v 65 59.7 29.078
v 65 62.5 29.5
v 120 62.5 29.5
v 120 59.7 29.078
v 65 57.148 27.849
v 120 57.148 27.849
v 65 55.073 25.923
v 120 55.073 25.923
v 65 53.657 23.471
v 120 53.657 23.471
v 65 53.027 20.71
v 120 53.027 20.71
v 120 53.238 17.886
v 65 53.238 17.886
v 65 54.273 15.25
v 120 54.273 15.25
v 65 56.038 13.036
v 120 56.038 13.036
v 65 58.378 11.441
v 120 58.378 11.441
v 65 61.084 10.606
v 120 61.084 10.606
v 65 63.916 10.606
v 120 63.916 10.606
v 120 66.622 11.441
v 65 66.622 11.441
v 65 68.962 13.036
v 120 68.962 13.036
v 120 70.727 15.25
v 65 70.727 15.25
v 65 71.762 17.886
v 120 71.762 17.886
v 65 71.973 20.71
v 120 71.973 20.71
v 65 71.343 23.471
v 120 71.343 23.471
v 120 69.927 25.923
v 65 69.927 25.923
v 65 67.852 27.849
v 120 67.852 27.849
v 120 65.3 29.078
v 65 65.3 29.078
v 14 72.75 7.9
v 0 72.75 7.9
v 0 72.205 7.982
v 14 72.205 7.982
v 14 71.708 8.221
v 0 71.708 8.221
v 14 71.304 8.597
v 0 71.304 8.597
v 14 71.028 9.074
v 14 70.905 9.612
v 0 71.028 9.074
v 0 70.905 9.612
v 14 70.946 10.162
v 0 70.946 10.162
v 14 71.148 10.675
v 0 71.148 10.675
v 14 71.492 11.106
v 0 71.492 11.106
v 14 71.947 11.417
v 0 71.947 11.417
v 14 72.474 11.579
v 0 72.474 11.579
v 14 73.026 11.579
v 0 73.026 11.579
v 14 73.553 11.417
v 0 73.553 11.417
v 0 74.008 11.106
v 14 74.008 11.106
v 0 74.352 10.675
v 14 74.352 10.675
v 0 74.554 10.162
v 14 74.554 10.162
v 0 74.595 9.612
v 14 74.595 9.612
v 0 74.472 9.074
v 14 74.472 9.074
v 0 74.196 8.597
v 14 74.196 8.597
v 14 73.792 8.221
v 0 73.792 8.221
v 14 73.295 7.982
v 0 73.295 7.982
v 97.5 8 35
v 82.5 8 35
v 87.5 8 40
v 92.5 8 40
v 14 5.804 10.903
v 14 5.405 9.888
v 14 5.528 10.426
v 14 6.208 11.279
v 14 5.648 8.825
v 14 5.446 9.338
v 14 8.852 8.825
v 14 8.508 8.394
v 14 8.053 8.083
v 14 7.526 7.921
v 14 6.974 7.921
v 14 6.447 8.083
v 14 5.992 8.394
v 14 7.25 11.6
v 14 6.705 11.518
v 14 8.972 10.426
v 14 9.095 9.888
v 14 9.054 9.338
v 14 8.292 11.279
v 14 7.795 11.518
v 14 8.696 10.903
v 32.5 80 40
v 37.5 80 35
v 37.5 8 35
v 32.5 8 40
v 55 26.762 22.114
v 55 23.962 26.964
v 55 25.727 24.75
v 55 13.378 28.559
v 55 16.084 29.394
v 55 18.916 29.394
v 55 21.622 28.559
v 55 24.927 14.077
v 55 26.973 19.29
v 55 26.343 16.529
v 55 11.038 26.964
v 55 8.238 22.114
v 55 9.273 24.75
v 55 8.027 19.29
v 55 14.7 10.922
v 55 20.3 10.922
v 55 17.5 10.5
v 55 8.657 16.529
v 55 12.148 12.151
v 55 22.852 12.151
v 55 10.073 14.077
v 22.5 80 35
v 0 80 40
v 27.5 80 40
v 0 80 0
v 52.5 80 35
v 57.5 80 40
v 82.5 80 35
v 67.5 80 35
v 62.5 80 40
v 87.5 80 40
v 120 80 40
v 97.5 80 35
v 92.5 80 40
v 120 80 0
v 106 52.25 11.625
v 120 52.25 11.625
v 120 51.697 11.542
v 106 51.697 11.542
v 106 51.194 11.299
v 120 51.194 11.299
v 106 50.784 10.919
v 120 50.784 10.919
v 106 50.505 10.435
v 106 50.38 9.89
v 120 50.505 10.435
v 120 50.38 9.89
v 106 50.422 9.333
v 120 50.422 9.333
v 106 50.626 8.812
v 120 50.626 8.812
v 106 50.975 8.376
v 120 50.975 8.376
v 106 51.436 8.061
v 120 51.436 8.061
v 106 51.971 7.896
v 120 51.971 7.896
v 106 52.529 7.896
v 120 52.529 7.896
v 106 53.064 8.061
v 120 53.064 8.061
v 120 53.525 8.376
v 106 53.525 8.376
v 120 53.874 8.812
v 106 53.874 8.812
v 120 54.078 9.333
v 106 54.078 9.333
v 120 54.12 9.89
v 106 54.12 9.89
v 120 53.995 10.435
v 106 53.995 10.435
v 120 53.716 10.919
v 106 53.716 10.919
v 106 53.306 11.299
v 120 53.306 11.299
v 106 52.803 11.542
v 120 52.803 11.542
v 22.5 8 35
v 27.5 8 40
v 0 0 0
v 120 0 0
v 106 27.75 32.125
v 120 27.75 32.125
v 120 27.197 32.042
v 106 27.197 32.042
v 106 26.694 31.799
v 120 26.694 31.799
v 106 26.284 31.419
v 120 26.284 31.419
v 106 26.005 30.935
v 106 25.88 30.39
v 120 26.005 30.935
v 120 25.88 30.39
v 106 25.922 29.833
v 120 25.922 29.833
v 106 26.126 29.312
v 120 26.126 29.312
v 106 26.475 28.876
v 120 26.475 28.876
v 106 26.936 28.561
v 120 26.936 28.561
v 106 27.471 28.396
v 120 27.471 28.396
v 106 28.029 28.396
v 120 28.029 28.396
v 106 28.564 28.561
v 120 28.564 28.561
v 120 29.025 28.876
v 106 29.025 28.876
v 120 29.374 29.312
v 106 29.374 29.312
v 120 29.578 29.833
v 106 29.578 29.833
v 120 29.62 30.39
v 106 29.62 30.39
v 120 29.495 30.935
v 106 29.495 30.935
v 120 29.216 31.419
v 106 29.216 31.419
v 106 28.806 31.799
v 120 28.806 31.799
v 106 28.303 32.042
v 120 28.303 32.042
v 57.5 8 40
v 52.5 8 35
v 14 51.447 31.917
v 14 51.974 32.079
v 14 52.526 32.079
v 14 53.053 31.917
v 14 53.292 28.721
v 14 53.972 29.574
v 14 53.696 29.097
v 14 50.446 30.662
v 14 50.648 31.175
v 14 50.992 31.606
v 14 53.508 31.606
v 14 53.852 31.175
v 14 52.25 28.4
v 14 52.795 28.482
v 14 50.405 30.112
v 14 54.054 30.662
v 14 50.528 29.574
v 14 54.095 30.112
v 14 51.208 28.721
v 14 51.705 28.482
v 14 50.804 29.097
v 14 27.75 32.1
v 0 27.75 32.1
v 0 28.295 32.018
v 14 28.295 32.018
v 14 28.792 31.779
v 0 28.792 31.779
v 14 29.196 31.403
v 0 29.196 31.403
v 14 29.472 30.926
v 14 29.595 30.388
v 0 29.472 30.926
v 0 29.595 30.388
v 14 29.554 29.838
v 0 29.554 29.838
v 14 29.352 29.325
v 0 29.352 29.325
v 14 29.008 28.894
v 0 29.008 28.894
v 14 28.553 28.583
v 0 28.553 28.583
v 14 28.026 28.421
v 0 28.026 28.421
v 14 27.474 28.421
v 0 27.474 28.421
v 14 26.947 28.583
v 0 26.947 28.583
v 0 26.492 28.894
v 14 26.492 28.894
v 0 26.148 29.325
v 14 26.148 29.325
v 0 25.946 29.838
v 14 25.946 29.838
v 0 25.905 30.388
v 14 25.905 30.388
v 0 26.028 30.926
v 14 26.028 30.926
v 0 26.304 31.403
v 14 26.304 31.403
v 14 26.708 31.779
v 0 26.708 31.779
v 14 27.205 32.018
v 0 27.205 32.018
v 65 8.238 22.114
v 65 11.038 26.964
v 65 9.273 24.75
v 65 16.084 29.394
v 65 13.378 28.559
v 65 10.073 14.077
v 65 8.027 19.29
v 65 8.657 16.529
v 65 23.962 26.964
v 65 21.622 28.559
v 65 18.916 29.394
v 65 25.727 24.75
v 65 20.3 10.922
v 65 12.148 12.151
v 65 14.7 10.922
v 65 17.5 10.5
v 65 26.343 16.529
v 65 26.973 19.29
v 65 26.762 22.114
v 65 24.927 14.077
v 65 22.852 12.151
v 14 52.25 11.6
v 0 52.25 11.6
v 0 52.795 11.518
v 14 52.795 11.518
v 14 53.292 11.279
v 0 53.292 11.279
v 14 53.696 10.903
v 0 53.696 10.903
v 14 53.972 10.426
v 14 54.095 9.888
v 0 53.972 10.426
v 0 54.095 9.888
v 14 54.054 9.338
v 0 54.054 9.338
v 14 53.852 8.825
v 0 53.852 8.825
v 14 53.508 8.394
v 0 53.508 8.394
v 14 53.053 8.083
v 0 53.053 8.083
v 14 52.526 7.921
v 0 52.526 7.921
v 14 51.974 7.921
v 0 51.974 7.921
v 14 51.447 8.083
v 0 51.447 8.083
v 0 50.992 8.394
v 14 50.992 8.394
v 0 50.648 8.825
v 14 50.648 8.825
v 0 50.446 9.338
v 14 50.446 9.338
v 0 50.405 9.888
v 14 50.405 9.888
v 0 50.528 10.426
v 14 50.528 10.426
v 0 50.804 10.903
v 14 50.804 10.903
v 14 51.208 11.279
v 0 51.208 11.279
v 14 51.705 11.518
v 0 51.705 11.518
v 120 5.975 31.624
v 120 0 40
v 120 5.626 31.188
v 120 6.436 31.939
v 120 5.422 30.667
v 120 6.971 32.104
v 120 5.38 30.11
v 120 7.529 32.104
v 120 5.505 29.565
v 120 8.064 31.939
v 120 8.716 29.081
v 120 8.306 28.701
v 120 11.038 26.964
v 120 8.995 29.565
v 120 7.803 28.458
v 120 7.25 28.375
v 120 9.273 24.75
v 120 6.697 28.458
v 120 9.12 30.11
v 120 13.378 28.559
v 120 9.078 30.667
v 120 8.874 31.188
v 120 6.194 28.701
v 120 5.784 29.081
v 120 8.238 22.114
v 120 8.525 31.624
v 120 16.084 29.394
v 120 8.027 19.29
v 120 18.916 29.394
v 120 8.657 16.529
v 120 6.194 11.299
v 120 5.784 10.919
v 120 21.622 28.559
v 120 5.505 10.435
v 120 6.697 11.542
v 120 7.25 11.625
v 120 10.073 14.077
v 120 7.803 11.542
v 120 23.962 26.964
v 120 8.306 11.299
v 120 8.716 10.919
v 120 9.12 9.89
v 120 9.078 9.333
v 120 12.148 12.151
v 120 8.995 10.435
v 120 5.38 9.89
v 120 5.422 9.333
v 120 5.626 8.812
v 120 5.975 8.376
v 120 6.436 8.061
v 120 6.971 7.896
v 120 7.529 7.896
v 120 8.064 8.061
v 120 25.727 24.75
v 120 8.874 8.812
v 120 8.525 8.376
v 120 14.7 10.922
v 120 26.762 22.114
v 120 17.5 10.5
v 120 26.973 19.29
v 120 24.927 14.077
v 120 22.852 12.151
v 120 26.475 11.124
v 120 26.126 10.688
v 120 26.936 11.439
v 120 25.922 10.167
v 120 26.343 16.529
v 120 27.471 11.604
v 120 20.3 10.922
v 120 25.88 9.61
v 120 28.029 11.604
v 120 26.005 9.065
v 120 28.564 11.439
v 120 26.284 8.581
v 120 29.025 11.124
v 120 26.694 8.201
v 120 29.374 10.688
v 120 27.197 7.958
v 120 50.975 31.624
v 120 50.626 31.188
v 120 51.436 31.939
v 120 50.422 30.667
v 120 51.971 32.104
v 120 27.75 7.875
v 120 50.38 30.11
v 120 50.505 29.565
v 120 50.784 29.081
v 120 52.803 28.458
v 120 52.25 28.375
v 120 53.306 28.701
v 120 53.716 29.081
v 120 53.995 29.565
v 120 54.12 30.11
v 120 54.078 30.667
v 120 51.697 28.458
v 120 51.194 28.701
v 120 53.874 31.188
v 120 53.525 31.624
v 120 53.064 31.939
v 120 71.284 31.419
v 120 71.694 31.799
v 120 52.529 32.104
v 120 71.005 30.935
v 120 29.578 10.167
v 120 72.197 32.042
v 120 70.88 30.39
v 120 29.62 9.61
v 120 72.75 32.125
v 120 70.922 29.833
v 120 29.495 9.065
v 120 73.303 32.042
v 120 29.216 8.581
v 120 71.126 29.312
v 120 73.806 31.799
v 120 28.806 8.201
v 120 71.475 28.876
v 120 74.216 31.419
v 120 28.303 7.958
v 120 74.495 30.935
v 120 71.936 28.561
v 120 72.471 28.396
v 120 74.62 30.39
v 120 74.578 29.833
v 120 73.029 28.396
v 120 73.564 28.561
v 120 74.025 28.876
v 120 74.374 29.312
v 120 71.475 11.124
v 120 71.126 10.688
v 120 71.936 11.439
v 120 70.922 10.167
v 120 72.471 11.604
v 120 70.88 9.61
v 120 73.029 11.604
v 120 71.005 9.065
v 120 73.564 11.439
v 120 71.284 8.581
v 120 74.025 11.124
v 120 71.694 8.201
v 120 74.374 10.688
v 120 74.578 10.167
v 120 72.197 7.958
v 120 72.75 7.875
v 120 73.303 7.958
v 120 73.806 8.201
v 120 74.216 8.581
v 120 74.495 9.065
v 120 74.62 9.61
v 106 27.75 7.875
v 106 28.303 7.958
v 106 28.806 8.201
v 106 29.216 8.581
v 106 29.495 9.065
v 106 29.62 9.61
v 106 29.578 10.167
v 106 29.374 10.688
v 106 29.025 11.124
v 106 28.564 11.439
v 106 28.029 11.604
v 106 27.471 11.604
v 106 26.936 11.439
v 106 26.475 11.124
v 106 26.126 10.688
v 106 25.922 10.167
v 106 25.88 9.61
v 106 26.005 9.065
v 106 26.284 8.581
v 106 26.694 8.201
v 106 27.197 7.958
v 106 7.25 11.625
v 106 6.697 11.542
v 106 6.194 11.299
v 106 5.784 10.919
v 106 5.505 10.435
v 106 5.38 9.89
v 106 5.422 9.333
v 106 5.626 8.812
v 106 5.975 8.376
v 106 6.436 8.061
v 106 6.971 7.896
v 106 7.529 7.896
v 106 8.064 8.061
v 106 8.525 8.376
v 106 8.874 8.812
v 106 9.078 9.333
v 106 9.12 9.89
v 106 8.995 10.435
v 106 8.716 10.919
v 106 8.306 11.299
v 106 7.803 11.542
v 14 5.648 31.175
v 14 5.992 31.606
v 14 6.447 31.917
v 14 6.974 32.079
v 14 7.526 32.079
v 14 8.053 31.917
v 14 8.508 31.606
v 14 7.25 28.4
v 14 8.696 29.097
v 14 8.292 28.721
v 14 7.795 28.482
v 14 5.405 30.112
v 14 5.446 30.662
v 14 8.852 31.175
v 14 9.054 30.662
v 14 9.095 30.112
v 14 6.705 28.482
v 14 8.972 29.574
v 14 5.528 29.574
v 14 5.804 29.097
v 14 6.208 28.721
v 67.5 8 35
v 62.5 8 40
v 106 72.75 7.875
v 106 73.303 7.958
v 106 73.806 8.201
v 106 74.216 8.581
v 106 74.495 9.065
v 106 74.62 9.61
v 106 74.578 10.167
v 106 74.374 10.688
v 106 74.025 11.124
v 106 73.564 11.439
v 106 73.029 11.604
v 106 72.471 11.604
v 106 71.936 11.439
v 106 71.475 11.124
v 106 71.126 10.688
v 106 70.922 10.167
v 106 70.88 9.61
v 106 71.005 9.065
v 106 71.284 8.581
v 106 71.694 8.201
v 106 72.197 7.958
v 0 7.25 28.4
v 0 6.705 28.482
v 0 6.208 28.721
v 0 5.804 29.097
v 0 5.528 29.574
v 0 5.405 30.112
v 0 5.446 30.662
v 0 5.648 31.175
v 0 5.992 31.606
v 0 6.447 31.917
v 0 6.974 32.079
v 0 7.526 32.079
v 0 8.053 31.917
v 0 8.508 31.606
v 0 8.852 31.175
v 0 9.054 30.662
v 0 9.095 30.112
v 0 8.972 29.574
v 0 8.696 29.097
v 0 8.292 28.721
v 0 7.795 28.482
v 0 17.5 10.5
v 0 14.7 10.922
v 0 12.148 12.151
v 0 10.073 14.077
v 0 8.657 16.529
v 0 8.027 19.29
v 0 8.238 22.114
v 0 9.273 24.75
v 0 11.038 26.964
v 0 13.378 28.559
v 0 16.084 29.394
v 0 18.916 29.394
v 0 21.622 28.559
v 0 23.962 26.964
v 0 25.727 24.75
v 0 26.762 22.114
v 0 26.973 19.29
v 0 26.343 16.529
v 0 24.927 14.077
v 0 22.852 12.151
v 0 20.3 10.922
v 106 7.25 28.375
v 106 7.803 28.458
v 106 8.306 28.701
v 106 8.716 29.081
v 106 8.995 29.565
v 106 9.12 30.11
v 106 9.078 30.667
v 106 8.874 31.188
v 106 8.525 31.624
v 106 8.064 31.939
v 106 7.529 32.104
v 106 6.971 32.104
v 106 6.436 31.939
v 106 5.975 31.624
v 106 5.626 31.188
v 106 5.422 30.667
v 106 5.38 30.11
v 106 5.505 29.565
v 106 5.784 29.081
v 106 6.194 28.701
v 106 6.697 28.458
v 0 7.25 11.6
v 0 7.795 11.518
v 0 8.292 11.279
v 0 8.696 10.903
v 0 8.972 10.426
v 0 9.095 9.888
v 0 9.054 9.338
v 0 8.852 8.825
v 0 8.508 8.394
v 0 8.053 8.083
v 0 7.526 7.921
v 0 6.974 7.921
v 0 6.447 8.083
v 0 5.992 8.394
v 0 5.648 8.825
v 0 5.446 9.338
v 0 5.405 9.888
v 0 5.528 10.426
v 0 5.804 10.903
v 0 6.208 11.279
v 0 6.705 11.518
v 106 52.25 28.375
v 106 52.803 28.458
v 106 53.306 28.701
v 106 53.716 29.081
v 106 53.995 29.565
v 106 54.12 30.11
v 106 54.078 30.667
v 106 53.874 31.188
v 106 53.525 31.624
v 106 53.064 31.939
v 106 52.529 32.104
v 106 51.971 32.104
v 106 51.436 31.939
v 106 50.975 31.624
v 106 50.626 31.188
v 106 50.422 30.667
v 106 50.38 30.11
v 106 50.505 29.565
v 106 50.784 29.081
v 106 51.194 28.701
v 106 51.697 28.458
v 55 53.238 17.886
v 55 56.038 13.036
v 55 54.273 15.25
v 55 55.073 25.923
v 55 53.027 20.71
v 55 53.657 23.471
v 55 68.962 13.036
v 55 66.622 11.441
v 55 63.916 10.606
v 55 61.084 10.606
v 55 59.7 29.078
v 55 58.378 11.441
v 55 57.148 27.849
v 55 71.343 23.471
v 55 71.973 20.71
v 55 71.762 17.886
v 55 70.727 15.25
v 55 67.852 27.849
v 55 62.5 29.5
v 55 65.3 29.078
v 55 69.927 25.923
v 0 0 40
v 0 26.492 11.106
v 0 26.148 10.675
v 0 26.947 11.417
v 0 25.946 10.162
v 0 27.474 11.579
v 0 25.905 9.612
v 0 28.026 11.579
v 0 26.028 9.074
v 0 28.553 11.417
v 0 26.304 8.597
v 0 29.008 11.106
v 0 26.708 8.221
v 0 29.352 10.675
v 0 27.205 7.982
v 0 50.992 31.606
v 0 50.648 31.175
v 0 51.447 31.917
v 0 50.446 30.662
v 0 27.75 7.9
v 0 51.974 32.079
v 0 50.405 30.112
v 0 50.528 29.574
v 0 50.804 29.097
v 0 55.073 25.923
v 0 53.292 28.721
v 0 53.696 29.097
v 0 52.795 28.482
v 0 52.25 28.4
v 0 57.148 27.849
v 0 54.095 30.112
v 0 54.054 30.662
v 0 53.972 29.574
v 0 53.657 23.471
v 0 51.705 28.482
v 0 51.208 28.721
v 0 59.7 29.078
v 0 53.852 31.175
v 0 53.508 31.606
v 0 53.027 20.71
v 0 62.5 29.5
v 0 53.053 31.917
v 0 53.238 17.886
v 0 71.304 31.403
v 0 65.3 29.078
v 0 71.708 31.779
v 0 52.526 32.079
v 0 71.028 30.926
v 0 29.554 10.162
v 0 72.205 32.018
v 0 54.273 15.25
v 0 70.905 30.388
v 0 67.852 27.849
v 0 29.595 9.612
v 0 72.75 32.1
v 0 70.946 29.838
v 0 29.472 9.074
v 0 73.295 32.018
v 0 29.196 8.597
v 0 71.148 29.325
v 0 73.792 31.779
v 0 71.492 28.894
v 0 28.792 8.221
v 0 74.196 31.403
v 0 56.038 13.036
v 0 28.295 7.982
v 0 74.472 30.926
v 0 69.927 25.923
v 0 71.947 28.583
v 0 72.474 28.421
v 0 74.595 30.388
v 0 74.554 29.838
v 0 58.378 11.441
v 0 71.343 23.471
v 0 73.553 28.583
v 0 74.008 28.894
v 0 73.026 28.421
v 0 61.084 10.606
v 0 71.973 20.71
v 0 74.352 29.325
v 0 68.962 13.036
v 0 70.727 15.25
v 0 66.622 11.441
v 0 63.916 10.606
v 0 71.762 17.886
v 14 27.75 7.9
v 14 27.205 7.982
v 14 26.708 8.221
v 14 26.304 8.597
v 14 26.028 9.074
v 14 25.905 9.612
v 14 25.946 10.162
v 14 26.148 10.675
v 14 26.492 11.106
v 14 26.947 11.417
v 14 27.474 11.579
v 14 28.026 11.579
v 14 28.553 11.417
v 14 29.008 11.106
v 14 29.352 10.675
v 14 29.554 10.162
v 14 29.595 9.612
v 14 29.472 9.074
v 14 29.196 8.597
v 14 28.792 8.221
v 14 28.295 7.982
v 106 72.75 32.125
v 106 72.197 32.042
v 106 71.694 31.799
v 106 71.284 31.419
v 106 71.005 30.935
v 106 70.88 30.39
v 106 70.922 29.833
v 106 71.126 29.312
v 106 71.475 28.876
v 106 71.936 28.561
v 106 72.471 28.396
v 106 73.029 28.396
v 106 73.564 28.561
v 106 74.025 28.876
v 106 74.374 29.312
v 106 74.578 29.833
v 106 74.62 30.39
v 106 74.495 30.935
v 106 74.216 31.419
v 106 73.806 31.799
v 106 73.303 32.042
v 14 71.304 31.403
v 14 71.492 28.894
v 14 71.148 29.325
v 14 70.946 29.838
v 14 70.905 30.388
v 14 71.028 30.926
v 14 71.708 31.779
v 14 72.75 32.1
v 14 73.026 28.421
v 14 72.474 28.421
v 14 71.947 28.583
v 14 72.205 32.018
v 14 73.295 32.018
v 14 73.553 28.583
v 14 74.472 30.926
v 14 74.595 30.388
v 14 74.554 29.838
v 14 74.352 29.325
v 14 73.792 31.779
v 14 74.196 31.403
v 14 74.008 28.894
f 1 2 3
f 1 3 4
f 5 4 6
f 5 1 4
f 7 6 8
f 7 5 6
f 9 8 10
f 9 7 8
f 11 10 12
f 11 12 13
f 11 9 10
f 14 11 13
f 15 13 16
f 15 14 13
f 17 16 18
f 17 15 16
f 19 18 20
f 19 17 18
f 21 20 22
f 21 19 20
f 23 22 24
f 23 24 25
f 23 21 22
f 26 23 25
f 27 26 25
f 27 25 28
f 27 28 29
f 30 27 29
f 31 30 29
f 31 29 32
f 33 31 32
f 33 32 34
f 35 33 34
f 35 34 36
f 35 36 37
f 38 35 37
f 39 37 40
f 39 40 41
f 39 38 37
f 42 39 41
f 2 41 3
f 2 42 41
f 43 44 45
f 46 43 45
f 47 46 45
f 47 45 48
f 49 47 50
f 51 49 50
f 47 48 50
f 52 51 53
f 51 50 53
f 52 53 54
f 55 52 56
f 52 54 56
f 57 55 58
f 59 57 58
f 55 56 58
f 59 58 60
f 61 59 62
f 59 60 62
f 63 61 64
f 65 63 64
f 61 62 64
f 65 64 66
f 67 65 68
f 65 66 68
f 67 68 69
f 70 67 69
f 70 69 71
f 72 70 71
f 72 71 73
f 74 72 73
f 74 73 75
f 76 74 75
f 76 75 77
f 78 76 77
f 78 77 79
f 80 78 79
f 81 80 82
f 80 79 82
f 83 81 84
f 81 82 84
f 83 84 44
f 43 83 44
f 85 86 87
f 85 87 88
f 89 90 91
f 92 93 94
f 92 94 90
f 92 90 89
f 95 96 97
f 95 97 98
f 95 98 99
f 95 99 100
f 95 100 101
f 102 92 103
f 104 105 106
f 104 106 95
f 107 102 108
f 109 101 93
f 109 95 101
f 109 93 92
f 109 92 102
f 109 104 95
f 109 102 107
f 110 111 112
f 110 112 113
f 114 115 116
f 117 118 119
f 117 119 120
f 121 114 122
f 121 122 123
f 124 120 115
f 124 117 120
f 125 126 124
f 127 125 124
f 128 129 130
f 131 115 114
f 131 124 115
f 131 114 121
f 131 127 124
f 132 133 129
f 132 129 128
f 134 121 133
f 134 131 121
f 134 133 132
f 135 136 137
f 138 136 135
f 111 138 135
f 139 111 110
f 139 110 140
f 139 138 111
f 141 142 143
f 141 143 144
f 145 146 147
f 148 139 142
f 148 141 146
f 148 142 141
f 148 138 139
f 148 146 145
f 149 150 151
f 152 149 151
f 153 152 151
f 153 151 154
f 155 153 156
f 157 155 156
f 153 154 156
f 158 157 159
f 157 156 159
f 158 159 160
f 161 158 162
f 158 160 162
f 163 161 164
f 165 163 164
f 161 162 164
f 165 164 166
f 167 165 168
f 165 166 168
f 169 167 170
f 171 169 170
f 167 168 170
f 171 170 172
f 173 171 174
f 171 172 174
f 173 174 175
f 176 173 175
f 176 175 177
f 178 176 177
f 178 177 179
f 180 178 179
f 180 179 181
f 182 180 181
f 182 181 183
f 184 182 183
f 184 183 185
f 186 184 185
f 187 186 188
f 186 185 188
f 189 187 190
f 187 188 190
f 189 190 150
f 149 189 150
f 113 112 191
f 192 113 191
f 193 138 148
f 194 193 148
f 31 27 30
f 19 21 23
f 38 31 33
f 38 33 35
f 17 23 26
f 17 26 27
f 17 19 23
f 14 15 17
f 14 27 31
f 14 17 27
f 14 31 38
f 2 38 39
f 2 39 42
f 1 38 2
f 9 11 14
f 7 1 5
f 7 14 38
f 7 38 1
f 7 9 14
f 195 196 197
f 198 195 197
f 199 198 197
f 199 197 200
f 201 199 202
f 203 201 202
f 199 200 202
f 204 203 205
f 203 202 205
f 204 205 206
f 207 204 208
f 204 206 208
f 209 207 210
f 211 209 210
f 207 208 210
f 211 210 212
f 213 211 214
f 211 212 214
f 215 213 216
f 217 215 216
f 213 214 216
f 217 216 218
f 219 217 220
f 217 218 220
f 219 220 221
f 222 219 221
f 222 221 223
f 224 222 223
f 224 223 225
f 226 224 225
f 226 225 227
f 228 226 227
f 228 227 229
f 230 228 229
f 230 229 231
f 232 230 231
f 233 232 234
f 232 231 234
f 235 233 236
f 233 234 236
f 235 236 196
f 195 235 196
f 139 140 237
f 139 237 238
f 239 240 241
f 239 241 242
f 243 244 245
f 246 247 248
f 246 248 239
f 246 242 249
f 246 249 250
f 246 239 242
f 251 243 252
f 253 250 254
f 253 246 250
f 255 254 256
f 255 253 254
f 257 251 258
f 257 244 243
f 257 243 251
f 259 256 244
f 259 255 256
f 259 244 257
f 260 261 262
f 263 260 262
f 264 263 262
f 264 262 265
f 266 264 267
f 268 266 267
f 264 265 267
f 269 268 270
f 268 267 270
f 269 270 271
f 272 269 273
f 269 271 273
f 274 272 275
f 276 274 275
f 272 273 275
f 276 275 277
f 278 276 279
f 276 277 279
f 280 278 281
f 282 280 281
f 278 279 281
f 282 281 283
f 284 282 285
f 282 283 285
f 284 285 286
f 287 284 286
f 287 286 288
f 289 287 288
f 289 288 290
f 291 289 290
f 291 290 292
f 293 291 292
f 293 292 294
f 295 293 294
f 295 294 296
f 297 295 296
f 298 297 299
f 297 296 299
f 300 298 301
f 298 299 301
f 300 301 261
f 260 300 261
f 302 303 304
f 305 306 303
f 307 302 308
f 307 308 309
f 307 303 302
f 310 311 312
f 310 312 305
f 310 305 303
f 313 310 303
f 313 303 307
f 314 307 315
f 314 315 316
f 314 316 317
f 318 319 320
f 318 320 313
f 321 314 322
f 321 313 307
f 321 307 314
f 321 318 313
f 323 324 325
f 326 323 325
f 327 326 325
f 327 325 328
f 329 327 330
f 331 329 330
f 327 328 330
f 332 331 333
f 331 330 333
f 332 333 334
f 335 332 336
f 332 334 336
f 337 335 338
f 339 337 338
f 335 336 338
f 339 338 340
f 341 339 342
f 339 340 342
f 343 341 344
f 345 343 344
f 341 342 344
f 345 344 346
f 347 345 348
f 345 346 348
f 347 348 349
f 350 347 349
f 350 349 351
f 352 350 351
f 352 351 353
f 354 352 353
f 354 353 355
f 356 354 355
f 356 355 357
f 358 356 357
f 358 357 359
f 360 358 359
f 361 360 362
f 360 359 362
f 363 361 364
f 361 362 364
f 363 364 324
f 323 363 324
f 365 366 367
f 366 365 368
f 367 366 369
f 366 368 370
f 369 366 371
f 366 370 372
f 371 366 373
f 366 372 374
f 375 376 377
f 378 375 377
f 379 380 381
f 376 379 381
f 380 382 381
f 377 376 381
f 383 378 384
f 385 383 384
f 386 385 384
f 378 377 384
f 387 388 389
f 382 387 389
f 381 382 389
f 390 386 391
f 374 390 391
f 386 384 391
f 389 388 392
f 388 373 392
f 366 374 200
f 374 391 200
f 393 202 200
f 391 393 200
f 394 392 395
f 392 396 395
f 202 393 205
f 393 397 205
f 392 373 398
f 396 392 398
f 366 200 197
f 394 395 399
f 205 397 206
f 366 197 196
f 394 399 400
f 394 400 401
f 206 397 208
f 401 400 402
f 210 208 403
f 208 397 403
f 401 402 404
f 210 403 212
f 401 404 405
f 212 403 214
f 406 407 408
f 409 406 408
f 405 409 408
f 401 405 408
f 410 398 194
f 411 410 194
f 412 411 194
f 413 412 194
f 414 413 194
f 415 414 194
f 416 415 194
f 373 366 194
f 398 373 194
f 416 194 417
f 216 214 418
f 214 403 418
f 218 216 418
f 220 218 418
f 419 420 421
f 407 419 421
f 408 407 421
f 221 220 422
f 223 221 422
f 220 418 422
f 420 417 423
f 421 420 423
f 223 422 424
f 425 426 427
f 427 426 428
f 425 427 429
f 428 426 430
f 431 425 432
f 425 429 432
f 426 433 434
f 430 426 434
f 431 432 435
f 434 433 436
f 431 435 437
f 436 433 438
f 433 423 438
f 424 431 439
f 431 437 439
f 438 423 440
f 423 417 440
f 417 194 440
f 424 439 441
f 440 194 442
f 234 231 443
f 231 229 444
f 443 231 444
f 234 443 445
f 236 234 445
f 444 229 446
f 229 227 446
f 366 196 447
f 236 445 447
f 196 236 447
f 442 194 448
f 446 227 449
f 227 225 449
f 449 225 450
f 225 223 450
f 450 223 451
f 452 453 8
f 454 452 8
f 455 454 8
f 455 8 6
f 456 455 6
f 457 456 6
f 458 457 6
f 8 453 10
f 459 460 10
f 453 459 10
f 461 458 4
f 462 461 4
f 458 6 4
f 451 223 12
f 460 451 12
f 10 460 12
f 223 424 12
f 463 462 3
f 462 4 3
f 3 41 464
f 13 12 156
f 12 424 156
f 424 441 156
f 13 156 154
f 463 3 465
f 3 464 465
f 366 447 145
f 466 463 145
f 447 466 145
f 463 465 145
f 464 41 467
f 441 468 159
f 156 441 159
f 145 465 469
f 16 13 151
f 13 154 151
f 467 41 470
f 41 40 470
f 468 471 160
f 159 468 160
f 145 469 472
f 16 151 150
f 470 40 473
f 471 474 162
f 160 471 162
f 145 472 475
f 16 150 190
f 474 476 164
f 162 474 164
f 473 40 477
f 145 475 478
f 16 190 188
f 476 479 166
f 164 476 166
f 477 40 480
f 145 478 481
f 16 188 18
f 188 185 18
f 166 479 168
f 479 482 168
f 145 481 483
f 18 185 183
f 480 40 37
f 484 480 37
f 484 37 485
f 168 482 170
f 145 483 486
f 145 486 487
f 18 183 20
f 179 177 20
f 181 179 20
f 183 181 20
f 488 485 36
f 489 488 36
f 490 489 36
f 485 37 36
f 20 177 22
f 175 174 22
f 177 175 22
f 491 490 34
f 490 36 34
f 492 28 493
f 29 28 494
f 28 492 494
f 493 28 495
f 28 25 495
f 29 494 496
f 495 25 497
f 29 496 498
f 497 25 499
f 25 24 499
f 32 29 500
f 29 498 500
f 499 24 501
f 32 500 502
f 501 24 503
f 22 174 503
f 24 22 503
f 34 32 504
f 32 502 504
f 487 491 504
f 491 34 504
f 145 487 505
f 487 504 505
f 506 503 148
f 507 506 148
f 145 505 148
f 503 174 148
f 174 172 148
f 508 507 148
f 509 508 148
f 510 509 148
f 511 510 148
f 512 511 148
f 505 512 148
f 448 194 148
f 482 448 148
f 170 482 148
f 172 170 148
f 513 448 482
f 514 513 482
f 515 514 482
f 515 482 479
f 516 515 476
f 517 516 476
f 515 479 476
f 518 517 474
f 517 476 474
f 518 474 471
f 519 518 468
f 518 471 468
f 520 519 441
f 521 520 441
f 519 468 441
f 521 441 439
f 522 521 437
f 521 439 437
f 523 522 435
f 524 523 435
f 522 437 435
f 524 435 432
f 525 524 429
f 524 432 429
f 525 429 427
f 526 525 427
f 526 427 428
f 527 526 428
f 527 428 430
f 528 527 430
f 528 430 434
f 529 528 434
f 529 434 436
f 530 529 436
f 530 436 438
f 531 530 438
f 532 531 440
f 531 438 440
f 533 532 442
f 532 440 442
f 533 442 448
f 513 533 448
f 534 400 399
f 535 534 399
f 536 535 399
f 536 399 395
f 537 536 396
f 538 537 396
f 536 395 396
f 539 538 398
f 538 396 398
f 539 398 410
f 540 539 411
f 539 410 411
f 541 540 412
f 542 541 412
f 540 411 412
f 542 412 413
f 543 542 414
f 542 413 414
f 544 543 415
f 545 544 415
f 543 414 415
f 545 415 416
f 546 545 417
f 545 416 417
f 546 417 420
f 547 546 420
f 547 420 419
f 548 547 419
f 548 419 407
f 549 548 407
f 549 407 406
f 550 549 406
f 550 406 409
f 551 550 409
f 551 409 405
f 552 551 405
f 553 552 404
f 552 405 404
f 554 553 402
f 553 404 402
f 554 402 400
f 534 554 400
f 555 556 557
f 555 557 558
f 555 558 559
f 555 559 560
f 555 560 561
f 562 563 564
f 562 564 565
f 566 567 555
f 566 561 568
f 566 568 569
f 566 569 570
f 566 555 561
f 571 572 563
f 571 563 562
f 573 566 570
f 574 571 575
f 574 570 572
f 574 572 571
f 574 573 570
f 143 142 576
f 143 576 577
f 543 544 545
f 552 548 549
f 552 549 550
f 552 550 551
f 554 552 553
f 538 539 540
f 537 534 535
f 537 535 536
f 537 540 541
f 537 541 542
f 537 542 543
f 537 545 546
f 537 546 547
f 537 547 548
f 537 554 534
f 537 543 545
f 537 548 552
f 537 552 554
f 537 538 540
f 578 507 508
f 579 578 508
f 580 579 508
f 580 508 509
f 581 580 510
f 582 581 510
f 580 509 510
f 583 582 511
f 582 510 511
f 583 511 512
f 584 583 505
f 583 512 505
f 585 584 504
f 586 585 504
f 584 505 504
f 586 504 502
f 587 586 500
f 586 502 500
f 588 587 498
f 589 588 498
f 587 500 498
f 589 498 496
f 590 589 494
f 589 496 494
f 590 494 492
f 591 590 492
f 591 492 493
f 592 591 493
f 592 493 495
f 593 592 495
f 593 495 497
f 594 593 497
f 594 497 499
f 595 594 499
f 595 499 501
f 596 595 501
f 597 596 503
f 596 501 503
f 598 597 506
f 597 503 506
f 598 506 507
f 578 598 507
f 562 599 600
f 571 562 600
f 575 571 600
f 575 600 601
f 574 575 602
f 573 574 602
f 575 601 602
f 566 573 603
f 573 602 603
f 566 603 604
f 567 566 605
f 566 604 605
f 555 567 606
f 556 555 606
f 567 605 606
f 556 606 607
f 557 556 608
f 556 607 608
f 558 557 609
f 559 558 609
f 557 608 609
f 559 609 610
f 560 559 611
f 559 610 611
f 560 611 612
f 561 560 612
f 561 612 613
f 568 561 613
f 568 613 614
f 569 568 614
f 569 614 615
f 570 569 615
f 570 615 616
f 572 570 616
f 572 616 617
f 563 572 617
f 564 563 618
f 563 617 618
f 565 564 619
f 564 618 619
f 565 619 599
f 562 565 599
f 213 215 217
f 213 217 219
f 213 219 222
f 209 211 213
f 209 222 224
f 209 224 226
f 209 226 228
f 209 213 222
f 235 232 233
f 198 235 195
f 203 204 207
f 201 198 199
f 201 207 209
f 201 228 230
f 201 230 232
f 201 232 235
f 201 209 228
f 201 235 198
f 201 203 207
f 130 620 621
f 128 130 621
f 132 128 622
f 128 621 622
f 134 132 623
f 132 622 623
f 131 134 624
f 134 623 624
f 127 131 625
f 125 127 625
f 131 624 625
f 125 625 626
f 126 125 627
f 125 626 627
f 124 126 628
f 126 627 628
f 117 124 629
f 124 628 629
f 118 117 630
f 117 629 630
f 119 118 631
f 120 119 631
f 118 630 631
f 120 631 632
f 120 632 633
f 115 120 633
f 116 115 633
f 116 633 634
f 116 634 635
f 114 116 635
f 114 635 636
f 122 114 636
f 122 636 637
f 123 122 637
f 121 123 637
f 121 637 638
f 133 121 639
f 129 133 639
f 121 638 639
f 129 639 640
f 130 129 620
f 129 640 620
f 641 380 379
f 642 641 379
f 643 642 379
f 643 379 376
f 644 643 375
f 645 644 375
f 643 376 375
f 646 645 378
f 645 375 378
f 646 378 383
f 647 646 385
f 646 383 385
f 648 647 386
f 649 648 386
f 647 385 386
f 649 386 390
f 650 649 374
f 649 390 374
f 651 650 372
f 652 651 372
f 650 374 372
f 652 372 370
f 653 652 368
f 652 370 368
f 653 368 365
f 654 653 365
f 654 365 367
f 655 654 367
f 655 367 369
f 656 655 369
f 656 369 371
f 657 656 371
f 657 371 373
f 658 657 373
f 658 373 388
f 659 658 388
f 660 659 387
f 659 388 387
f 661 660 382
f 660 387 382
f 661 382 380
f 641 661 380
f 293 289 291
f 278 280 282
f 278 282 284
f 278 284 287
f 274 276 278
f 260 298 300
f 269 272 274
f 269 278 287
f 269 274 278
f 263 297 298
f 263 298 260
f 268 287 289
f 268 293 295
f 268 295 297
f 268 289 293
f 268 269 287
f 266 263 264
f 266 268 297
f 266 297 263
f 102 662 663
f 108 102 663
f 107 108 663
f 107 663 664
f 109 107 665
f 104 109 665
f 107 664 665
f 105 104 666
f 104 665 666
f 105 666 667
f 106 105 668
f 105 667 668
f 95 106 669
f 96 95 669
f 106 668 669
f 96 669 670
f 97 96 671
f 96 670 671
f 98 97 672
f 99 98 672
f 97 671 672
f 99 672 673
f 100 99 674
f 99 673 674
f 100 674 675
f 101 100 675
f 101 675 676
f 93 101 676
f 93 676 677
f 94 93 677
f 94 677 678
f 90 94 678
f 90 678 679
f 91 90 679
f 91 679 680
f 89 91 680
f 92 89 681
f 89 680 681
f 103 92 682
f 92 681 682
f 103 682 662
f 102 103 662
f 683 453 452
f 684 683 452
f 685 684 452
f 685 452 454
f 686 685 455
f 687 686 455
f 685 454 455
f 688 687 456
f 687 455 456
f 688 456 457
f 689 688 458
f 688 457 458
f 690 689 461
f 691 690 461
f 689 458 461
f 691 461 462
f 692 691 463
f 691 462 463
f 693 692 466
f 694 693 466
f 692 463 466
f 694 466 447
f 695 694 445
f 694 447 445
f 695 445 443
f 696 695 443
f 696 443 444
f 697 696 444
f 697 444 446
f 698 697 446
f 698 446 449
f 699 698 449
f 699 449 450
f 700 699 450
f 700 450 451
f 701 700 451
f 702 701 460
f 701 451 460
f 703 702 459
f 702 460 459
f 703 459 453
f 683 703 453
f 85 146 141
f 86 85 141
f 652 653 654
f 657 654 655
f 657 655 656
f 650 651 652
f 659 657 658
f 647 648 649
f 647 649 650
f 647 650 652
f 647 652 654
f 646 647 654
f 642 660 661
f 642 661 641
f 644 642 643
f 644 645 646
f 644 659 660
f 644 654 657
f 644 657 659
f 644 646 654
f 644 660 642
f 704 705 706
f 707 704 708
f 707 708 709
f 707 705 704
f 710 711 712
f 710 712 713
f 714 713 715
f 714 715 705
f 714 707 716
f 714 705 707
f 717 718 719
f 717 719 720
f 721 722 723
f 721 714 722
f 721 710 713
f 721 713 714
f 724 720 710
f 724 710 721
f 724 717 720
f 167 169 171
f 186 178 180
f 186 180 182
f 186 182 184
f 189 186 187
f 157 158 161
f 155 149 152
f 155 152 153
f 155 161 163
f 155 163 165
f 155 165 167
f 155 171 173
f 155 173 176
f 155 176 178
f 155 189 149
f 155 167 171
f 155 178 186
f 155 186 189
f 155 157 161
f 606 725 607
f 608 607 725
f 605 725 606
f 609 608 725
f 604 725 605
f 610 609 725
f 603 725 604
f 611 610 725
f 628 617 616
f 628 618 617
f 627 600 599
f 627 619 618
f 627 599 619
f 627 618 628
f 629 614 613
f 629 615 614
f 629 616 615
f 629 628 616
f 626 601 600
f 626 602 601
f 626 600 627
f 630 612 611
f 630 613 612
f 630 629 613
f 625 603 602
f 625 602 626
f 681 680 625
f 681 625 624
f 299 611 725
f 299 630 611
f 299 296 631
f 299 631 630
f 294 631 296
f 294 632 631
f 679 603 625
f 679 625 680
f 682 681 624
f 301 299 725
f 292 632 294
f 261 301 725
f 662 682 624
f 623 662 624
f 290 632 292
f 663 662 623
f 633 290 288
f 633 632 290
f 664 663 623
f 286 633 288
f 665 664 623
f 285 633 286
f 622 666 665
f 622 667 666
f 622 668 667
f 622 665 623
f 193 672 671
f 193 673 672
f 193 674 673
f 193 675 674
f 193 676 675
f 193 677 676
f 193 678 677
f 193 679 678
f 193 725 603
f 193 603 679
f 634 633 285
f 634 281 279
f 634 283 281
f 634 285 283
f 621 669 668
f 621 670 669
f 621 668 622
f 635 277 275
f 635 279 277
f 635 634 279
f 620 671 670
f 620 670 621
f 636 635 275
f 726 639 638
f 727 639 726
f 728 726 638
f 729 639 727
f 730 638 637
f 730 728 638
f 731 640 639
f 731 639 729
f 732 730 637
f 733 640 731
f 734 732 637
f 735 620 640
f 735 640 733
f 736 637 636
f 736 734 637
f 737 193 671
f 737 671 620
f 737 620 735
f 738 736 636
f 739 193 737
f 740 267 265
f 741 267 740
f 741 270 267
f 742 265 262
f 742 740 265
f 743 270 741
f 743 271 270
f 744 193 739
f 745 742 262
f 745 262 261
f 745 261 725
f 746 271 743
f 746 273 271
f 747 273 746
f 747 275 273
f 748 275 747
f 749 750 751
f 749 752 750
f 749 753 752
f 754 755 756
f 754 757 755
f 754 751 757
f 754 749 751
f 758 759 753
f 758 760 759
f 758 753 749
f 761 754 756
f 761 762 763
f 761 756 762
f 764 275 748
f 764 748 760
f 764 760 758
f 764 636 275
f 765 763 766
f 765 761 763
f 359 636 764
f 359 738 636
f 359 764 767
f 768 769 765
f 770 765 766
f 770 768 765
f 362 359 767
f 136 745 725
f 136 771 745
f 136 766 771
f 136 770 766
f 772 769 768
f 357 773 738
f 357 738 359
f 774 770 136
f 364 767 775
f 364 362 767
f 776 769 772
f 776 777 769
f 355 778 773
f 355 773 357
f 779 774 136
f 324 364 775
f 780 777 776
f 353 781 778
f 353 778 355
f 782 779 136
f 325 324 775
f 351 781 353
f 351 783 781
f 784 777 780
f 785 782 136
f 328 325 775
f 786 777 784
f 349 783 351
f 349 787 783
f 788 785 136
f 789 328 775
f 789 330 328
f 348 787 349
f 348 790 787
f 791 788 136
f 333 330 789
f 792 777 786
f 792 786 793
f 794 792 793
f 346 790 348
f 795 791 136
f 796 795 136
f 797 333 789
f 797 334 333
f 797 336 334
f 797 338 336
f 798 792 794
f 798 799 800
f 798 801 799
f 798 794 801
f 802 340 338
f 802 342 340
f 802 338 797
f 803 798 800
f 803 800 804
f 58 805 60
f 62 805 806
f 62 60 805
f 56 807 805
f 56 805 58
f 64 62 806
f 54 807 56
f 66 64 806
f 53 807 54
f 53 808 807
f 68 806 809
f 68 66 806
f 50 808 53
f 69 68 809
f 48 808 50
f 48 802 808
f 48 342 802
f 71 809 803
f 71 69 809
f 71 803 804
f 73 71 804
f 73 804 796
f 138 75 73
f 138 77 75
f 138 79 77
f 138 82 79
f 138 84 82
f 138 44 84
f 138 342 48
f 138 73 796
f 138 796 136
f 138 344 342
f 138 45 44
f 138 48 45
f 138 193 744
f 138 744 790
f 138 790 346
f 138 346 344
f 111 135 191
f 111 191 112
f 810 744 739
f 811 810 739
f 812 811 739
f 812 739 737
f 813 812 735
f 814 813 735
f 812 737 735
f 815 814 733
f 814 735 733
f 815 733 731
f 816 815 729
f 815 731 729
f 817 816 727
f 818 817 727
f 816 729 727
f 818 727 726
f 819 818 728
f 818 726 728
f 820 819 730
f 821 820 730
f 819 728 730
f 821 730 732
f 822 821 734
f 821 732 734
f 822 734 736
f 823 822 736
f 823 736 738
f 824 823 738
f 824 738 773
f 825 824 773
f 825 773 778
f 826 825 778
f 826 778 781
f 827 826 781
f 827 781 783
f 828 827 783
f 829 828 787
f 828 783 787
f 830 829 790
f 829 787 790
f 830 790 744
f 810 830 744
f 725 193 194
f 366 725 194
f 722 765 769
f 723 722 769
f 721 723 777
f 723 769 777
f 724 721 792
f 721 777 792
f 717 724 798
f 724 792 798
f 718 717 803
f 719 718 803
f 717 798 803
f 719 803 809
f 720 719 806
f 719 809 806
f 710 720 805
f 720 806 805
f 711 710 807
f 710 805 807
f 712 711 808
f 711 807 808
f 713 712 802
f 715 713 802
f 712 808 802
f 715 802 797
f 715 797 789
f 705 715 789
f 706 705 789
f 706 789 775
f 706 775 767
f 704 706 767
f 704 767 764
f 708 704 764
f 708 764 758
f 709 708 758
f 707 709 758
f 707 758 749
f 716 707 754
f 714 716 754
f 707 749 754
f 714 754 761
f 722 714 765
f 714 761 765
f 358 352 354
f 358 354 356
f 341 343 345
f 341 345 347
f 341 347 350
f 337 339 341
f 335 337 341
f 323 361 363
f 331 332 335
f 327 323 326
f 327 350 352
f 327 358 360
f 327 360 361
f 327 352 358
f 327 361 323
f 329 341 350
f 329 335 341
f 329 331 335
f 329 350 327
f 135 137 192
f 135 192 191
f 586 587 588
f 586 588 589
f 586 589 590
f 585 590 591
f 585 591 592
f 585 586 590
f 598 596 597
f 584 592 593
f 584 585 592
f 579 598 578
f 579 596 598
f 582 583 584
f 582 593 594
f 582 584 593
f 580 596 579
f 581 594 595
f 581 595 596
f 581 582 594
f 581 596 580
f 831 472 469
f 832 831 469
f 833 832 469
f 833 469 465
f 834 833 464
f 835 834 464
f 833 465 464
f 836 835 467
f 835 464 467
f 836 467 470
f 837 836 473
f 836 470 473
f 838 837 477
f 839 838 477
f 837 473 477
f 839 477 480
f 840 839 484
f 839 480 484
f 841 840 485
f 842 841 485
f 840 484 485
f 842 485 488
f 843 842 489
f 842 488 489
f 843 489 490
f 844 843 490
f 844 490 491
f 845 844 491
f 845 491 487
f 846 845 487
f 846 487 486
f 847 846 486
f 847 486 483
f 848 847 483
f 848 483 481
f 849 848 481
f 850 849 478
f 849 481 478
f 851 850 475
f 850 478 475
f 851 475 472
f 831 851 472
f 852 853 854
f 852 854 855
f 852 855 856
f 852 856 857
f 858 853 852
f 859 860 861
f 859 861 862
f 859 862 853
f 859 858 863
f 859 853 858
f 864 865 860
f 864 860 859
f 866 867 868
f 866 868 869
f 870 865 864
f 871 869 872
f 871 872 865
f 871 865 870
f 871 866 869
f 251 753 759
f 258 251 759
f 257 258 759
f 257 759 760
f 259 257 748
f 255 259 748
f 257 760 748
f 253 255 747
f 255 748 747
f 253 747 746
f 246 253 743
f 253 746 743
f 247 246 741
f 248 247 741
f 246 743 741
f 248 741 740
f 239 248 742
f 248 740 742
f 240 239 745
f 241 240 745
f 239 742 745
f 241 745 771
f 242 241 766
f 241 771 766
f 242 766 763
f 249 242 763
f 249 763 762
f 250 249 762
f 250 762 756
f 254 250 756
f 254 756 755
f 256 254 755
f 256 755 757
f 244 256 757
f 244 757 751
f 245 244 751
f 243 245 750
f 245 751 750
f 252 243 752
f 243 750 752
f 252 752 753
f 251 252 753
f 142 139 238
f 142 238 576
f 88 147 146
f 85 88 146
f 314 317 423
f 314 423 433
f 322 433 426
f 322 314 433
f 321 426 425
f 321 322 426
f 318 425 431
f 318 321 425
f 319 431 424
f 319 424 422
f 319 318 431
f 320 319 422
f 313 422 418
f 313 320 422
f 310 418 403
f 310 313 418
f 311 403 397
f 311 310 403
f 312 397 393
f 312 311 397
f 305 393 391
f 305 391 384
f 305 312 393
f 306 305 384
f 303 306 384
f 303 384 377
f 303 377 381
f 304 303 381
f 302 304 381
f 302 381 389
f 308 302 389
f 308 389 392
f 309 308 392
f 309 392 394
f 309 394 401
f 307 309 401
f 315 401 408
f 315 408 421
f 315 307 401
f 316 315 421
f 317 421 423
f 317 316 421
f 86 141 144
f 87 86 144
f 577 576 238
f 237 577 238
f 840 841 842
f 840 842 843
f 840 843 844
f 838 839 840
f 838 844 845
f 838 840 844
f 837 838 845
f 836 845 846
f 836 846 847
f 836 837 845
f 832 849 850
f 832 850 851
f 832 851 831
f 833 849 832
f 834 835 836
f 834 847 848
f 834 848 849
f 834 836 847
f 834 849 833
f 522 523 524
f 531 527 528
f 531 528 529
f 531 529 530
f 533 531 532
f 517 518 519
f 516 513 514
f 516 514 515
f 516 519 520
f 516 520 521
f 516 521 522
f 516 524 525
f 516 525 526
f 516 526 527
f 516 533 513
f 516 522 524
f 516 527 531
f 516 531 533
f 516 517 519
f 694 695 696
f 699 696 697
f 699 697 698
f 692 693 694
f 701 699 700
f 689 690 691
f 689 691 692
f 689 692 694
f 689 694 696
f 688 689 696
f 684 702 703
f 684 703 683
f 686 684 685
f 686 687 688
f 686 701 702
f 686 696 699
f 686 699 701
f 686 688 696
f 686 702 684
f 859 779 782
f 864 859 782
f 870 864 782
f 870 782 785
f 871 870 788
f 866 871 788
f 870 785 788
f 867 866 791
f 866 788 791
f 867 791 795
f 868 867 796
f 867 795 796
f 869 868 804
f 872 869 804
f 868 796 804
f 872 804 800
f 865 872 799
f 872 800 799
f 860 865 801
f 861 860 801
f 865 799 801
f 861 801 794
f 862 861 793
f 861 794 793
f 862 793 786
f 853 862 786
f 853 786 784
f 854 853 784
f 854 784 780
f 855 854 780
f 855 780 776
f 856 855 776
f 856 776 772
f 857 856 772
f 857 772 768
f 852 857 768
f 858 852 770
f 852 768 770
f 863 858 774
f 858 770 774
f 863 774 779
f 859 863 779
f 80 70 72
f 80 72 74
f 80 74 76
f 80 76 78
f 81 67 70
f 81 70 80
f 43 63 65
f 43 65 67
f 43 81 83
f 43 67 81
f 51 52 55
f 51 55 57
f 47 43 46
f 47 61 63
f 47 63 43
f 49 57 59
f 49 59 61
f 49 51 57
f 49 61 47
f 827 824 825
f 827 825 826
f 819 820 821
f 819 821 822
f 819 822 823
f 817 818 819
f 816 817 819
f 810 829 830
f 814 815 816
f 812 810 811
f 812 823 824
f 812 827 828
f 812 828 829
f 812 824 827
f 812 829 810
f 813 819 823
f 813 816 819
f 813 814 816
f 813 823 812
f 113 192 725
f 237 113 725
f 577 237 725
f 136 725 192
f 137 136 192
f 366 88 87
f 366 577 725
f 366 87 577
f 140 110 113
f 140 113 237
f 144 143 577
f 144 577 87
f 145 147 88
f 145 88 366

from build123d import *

# Parameters (mm, degrees)
SKETCH1_W                        = 120
SKETCH1_H                        = 80
BOSS_EXTRUDE1_DEPTH              = 40
SKETCH2_R                        = 1.85
LINEAR_BEARING_SCREW_CUTS_DEPTH  = 14
SKETCH3_R                        = 9.5
LINEAR_BEARINGS_HOLE_DEPTH       = 55
SKETCH4_R                        = 1.875
LINEAR_BEARING_SCREW_CUTS2_DEPTH = 14
LINEAR_BEARINGS_HOLE2_START      = -55
SKETCH5_R                        = 9.5
LINEAR_BEARINGS_HOLE2_DEPTH      = 55
CUT_EXTRUDE7_DEPTH               = 72


with BuildPart() as part:
    # Sketch1 → Boss-Extrude1 (new body)
    with BuildSketch(Plane.XY):
        with Locations((60, 40)):
            Rectangle(SKETCH1_W, SKETCH1_H)
    extrude(amount=BOSS_EXTRUDE1_DEPTH)

    # Sketch2 → linear-bearing-screw-cuts (cut)
    with BuildSketch(Plane.ZY):
        with Locations((30.25, 72.75)):
            Circle(SKETCH2_R)
        with Locations(Location((9.75, 72.75, 0), (0, 0, 180))):
            Circle(SKETCH2_R)
        with Locations(Location((30.25, 52.25, 0), (0, 0, 180))):
            Circle(SKETCH2_R)
        with Locations((9.75, 52.25)):
            Circle(SKETCH2_R)
        with Locations(Location((9.75, 27.75, 0), (0, 0, 180))):
            Circle(SKETCH2_R)
        with Locations((30.25, 27.75)):
            Circle(SKETCH2_R)
        with Locations(Location((30.25, 7.25, 0), (0, 0, 180))):
            Circle(SKETCH2_R)
        with Locations((9.75, 7.25)):
            Circle(SKETCH2_R)
    extrude(amount=-LINEAR_BEARING_SCREW_CUTS_DEPTH, mode=Mode.SUBTRACT)

    # Sketch3 → linear-bearings-hole (cut)
    with BuildSketch(Plane.ZY):
        with Locations((20, 62.5)):
            Circle(SKETCH3_R)
        with Locations(Location((20, 17.5, 0), (0, 0, 180))):
            Circle(SKETCH3_R)
    extrude(amount=-LINEAR_BEARINGS_HOLE_DEPTH, mode=Mode.SUBTRACT)

    # Sketch4 → linear-bearing-screw-cuts2 (cut)
    with BuildSketch(Plane(origin=(120, 0, 0), x_dir=(0, 0, -1), z_dir=(1, 0, 0))):
        with Locations((-9.75, 72.75)):
            Circle(SKETCH4_R)
        with Locations(Location((-30.25, 72.75, 0), (0, 0, 180))):
            Circle(SKETCH4_R)
        with Locations(Location((-9.75, 52.25, 0), (0, 0, 180))):
            Circle(SKETCH4_R)
        with Locations((-30.25, 52.25)):
            Circle(SKETCH4_R)
        with Locations(Location((-30.25, 27.75, 0), (0, 0, 180))):
            Circle(SKETCH4_R)
        with Locations((-9.75, 27.75)):
            Circle(SKETCH4_R)
        with Locations(Location((-9.75, 7.25, 0), (0, 0, 180))):
            Circle(SKETCH4_R)
        with Locations((-30.25, 7.25)):
            Circle(SKETCH4_R)
    extrude(amount=-LINEAR_BEARING_SCREW_CUTS2_DEPTH, mode=Mode.SUBTRACT)

    # Sketch5 → linear-bearings-hole2 (cut)
    with BuildSketch(Plane(origin=(120, 0, 0), x_dir=(0, 0, -1), z_dir=(1, 0, 0)).offset(LINEAR_BEARINGS_HOLE2_START)):
        with Locations(Location((-20, 62.5, 0), (0, 0, 180))):
            Circle(SKETCH5_R)
        with Locations((-20, 17.5)):
            Circle(SKETCH5_R)
    extrude(amount=LINEAR_BEARINGS_HOLE2_DEPTH, mode=Mode.SUBTRACT)

    # Sketch10 → Cut-Extrude7 (cut)
    with BuildSketch(Plane(origin=(0, 80, 0), x_dir=(1, 0, 0), z_dir=(0, 1, 0))):
        Polygon((92.5, -40), (97.5, -35), (82.5, -35), (87.5, -40), align=None)
        Polygon((67.5, -35), (62.5, -40), (57.5, -40), (52.5, -35), align=None)
        Polygon((37.5, -35), (32.5, -40), (27.5, -40), (22.5, -35), align=None)
    extrude(amount=-CUT_EXTRUDE7_DEPTH, mode=Mode.SUBTRACT)


solid = part.part
